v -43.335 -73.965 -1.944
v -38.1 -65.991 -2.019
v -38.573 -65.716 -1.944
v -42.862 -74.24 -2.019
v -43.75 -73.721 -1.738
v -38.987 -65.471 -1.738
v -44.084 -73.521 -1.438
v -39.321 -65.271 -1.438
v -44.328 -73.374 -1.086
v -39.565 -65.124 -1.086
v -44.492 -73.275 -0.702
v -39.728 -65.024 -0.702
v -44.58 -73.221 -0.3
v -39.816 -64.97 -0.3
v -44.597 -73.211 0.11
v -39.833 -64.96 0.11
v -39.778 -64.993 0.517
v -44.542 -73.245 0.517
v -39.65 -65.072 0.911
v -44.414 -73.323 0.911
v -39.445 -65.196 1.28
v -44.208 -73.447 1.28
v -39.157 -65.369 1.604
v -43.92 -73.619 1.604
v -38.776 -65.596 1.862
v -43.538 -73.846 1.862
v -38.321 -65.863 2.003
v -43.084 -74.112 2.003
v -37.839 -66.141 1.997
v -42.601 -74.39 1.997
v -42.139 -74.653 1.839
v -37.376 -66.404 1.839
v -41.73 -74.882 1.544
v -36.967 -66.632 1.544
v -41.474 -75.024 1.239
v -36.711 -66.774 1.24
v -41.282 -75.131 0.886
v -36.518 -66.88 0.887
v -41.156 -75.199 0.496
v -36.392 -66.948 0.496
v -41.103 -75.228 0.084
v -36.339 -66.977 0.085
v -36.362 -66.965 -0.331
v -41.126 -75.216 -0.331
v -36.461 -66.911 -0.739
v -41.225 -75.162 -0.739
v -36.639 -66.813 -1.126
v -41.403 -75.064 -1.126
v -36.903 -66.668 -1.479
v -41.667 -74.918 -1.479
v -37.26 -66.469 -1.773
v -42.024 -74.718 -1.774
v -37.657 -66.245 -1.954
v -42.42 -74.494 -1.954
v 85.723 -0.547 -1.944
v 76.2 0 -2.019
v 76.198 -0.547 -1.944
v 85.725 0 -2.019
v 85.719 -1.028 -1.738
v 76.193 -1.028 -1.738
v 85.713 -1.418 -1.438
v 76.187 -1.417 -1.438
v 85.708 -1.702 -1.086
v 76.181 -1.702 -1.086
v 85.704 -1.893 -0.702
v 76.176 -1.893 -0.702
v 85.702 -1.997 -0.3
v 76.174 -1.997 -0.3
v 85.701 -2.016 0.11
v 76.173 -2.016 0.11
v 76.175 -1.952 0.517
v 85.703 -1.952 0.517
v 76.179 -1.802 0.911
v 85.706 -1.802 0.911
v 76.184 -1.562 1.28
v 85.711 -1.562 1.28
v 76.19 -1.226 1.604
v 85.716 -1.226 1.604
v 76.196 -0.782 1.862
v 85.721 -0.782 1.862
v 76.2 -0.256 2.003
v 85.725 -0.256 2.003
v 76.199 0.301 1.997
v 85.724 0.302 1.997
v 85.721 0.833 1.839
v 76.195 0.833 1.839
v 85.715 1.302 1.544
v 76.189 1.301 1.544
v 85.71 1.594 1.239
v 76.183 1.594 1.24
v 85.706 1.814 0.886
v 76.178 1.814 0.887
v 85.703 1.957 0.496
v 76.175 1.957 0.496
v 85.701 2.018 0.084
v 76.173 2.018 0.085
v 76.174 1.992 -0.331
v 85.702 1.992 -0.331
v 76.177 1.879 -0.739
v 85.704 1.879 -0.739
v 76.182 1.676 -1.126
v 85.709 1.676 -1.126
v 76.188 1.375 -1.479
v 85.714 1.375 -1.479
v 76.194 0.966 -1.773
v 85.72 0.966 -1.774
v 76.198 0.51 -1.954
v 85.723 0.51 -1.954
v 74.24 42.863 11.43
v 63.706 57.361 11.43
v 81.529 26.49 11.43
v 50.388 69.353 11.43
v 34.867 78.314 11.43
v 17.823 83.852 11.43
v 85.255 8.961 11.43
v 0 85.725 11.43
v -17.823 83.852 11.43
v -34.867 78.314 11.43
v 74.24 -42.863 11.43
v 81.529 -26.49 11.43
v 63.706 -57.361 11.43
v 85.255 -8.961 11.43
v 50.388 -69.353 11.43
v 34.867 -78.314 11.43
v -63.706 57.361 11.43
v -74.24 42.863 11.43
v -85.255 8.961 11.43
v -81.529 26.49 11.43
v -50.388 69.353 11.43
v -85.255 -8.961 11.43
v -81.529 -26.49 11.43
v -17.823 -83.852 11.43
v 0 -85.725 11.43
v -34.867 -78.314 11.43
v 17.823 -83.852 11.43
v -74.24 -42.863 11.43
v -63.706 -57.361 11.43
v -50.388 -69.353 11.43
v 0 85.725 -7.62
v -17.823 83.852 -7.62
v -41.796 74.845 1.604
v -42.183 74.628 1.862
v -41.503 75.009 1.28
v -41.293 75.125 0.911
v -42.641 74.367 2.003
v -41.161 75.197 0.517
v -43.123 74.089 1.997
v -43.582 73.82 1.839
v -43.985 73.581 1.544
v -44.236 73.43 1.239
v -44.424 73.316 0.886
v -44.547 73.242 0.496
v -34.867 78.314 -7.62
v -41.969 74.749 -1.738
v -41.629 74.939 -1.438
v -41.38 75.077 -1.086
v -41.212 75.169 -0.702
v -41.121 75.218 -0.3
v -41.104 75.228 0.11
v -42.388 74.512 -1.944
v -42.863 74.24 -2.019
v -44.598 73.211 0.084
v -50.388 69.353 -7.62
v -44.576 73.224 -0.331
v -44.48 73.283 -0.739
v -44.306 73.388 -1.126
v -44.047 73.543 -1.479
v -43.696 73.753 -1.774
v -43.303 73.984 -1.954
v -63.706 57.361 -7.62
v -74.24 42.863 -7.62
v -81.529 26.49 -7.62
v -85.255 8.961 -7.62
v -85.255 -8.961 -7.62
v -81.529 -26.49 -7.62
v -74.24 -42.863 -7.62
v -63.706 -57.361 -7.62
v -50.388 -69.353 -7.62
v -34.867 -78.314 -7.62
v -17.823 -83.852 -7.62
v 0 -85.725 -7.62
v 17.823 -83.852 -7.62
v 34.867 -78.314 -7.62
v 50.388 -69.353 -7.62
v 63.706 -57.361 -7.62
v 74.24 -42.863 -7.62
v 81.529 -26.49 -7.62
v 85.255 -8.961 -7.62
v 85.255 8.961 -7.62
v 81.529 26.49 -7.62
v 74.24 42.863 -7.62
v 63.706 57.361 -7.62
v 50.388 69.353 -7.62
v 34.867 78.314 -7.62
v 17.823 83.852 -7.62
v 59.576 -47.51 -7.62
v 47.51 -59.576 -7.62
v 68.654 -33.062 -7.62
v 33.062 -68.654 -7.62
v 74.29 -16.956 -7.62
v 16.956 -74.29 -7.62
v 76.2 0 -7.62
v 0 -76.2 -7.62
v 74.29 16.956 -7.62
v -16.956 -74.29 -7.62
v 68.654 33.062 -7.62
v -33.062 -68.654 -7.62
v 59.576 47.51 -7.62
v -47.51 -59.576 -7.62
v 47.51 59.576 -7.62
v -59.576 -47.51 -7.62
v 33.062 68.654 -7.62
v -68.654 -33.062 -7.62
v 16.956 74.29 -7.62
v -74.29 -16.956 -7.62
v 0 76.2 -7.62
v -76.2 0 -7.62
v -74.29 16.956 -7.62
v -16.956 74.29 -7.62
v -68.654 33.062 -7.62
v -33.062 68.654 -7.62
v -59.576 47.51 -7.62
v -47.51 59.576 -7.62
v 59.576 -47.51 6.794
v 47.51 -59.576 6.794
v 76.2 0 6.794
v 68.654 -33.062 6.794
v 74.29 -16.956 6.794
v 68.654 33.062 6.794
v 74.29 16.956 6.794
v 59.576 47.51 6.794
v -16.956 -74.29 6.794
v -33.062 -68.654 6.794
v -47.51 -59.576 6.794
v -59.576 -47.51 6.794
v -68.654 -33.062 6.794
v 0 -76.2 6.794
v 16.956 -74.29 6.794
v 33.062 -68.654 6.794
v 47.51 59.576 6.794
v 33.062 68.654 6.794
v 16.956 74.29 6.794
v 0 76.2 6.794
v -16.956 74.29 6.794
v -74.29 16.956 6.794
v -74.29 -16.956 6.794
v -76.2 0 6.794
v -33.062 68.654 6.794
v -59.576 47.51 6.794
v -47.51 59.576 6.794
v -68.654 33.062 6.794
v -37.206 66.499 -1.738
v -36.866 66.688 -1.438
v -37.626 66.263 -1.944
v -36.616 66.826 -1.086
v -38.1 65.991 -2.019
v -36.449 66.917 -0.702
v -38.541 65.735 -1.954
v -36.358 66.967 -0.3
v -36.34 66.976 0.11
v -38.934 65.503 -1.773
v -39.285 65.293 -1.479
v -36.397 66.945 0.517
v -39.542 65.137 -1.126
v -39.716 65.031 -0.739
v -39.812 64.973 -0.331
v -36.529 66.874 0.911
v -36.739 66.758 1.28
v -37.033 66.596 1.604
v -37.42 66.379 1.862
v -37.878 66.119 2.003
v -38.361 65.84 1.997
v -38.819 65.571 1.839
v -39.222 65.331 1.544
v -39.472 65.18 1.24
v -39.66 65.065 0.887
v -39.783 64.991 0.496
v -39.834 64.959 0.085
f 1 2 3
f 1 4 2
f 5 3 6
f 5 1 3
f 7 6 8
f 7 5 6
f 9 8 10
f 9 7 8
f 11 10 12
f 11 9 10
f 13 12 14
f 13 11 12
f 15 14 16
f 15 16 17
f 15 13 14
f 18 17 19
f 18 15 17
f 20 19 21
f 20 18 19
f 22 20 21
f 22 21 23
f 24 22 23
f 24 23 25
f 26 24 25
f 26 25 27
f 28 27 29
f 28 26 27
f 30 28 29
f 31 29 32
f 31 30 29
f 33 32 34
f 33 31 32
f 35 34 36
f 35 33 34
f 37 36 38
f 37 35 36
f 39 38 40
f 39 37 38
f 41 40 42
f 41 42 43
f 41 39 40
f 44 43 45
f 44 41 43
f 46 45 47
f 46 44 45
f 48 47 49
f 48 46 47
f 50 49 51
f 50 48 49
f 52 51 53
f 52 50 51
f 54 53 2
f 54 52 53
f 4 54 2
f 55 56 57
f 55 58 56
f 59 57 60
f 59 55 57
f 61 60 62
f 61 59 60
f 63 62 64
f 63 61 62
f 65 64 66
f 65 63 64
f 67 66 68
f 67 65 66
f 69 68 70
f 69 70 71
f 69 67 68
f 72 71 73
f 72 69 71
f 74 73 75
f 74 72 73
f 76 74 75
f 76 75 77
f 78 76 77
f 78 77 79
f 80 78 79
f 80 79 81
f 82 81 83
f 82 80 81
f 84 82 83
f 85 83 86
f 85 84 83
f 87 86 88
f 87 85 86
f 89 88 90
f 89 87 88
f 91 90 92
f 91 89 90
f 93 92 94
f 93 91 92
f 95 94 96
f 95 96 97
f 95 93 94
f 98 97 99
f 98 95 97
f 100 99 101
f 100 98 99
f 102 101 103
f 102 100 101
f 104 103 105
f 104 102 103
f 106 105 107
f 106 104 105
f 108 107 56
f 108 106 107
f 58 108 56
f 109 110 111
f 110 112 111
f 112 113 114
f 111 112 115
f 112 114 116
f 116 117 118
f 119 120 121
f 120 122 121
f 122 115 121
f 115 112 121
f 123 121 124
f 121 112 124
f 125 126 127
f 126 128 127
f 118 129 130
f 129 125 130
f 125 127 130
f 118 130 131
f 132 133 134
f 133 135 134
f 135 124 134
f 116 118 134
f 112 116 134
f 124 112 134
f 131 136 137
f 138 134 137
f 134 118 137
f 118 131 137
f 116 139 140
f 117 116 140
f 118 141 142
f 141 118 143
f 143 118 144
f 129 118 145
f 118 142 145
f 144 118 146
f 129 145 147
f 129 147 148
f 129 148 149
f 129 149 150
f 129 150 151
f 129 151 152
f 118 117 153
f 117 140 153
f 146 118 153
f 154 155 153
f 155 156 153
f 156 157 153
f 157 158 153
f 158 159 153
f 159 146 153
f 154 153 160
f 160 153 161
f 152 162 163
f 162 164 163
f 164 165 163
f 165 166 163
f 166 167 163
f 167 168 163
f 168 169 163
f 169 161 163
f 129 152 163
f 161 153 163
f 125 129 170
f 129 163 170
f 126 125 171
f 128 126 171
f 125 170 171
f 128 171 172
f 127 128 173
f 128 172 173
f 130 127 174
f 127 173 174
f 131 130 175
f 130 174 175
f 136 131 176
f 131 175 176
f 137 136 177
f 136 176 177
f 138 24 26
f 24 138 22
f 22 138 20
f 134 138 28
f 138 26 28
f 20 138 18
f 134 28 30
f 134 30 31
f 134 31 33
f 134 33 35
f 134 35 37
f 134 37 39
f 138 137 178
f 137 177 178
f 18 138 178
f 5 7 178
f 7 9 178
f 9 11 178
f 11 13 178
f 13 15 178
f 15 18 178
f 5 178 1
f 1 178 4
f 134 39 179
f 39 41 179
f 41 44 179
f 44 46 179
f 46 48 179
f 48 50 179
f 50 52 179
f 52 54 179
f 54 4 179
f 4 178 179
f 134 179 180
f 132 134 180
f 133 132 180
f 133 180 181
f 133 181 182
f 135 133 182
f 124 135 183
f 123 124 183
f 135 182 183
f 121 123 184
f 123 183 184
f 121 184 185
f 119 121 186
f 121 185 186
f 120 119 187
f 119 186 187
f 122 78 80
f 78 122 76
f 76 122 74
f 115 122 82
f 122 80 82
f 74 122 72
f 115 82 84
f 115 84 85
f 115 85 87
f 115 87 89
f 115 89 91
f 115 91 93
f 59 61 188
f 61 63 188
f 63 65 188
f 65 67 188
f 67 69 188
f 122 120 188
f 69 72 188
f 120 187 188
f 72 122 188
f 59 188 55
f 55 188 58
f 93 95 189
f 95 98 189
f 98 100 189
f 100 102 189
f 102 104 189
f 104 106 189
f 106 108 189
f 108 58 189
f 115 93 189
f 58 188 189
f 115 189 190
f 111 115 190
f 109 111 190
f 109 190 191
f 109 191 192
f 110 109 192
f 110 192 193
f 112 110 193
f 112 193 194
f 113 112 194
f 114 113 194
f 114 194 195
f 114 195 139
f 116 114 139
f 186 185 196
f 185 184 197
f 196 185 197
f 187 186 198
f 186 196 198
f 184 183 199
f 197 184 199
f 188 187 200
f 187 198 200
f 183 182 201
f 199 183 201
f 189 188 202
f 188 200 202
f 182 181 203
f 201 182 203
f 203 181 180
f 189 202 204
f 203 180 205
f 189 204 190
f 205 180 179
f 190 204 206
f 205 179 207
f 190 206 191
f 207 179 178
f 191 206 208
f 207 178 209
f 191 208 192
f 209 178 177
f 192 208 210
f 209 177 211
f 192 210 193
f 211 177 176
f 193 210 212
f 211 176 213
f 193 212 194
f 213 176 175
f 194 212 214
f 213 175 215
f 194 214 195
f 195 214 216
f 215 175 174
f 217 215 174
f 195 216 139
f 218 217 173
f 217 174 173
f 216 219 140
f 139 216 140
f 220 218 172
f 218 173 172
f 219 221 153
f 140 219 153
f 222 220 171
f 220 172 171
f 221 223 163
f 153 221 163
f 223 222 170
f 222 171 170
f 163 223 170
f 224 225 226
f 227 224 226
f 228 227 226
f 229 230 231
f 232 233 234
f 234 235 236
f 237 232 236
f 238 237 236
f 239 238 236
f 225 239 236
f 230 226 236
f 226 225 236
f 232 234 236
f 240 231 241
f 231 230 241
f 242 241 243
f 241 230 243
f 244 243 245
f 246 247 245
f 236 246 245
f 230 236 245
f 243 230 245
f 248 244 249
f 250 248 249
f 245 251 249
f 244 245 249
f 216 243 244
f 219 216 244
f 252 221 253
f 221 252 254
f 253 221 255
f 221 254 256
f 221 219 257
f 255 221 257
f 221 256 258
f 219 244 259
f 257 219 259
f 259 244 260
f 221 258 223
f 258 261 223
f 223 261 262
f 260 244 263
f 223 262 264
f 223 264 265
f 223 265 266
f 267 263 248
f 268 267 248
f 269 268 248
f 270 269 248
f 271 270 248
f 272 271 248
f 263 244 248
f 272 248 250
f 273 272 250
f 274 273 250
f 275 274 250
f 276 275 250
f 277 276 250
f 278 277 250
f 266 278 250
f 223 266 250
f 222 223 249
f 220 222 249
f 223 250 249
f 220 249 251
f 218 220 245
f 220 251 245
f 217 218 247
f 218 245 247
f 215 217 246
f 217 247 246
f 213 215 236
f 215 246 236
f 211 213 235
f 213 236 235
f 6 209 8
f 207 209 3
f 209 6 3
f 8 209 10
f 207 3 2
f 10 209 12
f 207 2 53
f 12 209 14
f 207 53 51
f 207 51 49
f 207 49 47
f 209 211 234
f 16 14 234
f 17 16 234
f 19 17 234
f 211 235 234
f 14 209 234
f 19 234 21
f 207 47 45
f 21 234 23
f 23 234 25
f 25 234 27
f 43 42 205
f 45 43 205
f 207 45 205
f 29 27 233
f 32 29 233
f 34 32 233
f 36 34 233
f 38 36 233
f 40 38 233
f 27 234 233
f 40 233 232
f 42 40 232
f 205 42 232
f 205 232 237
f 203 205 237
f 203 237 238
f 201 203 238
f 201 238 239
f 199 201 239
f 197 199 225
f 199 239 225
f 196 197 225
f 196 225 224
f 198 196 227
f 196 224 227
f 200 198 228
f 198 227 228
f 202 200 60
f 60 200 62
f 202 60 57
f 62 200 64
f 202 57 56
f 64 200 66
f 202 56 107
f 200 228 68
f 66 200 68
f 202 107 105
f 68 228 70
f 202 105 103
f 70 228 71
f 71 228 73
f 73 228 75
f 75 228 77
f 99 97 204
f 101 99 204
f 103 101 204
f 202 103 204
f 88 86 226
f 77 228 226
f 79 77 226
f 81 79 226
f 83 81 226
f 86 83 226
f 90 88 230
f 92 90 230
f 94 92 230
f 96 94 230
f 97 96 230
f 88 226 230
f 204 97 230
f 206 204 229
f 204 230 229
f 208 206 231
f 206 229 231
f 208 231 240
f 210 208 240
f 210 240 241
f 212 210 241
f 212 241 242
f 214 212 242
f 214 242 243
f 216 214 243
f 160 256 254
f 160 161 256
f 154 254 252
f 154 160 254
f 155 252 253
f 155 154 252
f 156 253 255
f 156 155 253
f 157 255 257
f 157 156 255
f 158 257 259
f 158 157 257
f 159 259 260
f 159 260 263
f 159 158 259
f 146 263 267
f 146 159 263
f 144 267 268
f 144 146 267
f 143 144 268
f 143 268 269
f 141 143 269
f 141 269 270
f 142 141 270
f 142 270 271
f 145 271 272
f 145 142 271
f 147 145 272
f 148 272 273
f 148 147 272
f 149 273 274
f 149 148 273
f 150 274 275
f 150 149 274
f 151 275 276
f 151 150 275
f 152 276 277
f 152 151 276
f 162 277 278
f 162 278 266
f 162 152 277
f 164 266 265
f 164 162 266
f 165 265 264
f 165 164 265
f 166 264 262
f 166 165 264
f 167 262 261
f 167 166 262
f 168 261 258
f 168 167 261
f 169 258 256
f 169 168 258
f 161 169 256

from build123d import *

# Parameters (mm, degrees)
CIRPATTERN1_COUNT = 3


with BuildPart() as part:
    # Sketch1 → Revolve1 (revolve)
    with BuildSketch(Plane(origin=(0, 0, 0), x_dir=(0, 0, -1), z_dir=(1, 0, 0))):
        Polygon((-6.7945, 0), (-11.43, 0), (-11.43, 85.725), (7.62, 85.725), (7.62, 76.2), (-6.7945, 76.2), align=None)
    revolve(axis=Axis((0, 0, 0), (0, 0, 1)))

    # Sketch8 → #10-32 Tapped Hole1 (revolve, cut)
    with BuildSketch(Plane(origin=(85.725, 0, 0), x_dir=(0, 0, -1), z_dir=(0, 1, 0))):
        Polygon((0, 0), (0, 86.937317848), (2.0193, 85.724), (2.0193, 0), align=None)
    f_10_32_tapped_hole1 = revolve(axis=Axis((92.075, 0, 0), (-1, 0, 0)), mode=Mode.SUBTRACT)

    # CirPattern1: #10-32 Tapped Hole1 ×3 about axis
    cirpattern1_axis = Axis((0, 0, 0), (0, 0, -1))
    for i in range(1, CIRPATTERN1_COUNT):
        add(f_10_32_tapped_hole1.rotate(cirpattern1_axis, i * 360 / CIRPATTERN1_COUNT), mode=Mode.SUBTRACT)


solid = part.part
